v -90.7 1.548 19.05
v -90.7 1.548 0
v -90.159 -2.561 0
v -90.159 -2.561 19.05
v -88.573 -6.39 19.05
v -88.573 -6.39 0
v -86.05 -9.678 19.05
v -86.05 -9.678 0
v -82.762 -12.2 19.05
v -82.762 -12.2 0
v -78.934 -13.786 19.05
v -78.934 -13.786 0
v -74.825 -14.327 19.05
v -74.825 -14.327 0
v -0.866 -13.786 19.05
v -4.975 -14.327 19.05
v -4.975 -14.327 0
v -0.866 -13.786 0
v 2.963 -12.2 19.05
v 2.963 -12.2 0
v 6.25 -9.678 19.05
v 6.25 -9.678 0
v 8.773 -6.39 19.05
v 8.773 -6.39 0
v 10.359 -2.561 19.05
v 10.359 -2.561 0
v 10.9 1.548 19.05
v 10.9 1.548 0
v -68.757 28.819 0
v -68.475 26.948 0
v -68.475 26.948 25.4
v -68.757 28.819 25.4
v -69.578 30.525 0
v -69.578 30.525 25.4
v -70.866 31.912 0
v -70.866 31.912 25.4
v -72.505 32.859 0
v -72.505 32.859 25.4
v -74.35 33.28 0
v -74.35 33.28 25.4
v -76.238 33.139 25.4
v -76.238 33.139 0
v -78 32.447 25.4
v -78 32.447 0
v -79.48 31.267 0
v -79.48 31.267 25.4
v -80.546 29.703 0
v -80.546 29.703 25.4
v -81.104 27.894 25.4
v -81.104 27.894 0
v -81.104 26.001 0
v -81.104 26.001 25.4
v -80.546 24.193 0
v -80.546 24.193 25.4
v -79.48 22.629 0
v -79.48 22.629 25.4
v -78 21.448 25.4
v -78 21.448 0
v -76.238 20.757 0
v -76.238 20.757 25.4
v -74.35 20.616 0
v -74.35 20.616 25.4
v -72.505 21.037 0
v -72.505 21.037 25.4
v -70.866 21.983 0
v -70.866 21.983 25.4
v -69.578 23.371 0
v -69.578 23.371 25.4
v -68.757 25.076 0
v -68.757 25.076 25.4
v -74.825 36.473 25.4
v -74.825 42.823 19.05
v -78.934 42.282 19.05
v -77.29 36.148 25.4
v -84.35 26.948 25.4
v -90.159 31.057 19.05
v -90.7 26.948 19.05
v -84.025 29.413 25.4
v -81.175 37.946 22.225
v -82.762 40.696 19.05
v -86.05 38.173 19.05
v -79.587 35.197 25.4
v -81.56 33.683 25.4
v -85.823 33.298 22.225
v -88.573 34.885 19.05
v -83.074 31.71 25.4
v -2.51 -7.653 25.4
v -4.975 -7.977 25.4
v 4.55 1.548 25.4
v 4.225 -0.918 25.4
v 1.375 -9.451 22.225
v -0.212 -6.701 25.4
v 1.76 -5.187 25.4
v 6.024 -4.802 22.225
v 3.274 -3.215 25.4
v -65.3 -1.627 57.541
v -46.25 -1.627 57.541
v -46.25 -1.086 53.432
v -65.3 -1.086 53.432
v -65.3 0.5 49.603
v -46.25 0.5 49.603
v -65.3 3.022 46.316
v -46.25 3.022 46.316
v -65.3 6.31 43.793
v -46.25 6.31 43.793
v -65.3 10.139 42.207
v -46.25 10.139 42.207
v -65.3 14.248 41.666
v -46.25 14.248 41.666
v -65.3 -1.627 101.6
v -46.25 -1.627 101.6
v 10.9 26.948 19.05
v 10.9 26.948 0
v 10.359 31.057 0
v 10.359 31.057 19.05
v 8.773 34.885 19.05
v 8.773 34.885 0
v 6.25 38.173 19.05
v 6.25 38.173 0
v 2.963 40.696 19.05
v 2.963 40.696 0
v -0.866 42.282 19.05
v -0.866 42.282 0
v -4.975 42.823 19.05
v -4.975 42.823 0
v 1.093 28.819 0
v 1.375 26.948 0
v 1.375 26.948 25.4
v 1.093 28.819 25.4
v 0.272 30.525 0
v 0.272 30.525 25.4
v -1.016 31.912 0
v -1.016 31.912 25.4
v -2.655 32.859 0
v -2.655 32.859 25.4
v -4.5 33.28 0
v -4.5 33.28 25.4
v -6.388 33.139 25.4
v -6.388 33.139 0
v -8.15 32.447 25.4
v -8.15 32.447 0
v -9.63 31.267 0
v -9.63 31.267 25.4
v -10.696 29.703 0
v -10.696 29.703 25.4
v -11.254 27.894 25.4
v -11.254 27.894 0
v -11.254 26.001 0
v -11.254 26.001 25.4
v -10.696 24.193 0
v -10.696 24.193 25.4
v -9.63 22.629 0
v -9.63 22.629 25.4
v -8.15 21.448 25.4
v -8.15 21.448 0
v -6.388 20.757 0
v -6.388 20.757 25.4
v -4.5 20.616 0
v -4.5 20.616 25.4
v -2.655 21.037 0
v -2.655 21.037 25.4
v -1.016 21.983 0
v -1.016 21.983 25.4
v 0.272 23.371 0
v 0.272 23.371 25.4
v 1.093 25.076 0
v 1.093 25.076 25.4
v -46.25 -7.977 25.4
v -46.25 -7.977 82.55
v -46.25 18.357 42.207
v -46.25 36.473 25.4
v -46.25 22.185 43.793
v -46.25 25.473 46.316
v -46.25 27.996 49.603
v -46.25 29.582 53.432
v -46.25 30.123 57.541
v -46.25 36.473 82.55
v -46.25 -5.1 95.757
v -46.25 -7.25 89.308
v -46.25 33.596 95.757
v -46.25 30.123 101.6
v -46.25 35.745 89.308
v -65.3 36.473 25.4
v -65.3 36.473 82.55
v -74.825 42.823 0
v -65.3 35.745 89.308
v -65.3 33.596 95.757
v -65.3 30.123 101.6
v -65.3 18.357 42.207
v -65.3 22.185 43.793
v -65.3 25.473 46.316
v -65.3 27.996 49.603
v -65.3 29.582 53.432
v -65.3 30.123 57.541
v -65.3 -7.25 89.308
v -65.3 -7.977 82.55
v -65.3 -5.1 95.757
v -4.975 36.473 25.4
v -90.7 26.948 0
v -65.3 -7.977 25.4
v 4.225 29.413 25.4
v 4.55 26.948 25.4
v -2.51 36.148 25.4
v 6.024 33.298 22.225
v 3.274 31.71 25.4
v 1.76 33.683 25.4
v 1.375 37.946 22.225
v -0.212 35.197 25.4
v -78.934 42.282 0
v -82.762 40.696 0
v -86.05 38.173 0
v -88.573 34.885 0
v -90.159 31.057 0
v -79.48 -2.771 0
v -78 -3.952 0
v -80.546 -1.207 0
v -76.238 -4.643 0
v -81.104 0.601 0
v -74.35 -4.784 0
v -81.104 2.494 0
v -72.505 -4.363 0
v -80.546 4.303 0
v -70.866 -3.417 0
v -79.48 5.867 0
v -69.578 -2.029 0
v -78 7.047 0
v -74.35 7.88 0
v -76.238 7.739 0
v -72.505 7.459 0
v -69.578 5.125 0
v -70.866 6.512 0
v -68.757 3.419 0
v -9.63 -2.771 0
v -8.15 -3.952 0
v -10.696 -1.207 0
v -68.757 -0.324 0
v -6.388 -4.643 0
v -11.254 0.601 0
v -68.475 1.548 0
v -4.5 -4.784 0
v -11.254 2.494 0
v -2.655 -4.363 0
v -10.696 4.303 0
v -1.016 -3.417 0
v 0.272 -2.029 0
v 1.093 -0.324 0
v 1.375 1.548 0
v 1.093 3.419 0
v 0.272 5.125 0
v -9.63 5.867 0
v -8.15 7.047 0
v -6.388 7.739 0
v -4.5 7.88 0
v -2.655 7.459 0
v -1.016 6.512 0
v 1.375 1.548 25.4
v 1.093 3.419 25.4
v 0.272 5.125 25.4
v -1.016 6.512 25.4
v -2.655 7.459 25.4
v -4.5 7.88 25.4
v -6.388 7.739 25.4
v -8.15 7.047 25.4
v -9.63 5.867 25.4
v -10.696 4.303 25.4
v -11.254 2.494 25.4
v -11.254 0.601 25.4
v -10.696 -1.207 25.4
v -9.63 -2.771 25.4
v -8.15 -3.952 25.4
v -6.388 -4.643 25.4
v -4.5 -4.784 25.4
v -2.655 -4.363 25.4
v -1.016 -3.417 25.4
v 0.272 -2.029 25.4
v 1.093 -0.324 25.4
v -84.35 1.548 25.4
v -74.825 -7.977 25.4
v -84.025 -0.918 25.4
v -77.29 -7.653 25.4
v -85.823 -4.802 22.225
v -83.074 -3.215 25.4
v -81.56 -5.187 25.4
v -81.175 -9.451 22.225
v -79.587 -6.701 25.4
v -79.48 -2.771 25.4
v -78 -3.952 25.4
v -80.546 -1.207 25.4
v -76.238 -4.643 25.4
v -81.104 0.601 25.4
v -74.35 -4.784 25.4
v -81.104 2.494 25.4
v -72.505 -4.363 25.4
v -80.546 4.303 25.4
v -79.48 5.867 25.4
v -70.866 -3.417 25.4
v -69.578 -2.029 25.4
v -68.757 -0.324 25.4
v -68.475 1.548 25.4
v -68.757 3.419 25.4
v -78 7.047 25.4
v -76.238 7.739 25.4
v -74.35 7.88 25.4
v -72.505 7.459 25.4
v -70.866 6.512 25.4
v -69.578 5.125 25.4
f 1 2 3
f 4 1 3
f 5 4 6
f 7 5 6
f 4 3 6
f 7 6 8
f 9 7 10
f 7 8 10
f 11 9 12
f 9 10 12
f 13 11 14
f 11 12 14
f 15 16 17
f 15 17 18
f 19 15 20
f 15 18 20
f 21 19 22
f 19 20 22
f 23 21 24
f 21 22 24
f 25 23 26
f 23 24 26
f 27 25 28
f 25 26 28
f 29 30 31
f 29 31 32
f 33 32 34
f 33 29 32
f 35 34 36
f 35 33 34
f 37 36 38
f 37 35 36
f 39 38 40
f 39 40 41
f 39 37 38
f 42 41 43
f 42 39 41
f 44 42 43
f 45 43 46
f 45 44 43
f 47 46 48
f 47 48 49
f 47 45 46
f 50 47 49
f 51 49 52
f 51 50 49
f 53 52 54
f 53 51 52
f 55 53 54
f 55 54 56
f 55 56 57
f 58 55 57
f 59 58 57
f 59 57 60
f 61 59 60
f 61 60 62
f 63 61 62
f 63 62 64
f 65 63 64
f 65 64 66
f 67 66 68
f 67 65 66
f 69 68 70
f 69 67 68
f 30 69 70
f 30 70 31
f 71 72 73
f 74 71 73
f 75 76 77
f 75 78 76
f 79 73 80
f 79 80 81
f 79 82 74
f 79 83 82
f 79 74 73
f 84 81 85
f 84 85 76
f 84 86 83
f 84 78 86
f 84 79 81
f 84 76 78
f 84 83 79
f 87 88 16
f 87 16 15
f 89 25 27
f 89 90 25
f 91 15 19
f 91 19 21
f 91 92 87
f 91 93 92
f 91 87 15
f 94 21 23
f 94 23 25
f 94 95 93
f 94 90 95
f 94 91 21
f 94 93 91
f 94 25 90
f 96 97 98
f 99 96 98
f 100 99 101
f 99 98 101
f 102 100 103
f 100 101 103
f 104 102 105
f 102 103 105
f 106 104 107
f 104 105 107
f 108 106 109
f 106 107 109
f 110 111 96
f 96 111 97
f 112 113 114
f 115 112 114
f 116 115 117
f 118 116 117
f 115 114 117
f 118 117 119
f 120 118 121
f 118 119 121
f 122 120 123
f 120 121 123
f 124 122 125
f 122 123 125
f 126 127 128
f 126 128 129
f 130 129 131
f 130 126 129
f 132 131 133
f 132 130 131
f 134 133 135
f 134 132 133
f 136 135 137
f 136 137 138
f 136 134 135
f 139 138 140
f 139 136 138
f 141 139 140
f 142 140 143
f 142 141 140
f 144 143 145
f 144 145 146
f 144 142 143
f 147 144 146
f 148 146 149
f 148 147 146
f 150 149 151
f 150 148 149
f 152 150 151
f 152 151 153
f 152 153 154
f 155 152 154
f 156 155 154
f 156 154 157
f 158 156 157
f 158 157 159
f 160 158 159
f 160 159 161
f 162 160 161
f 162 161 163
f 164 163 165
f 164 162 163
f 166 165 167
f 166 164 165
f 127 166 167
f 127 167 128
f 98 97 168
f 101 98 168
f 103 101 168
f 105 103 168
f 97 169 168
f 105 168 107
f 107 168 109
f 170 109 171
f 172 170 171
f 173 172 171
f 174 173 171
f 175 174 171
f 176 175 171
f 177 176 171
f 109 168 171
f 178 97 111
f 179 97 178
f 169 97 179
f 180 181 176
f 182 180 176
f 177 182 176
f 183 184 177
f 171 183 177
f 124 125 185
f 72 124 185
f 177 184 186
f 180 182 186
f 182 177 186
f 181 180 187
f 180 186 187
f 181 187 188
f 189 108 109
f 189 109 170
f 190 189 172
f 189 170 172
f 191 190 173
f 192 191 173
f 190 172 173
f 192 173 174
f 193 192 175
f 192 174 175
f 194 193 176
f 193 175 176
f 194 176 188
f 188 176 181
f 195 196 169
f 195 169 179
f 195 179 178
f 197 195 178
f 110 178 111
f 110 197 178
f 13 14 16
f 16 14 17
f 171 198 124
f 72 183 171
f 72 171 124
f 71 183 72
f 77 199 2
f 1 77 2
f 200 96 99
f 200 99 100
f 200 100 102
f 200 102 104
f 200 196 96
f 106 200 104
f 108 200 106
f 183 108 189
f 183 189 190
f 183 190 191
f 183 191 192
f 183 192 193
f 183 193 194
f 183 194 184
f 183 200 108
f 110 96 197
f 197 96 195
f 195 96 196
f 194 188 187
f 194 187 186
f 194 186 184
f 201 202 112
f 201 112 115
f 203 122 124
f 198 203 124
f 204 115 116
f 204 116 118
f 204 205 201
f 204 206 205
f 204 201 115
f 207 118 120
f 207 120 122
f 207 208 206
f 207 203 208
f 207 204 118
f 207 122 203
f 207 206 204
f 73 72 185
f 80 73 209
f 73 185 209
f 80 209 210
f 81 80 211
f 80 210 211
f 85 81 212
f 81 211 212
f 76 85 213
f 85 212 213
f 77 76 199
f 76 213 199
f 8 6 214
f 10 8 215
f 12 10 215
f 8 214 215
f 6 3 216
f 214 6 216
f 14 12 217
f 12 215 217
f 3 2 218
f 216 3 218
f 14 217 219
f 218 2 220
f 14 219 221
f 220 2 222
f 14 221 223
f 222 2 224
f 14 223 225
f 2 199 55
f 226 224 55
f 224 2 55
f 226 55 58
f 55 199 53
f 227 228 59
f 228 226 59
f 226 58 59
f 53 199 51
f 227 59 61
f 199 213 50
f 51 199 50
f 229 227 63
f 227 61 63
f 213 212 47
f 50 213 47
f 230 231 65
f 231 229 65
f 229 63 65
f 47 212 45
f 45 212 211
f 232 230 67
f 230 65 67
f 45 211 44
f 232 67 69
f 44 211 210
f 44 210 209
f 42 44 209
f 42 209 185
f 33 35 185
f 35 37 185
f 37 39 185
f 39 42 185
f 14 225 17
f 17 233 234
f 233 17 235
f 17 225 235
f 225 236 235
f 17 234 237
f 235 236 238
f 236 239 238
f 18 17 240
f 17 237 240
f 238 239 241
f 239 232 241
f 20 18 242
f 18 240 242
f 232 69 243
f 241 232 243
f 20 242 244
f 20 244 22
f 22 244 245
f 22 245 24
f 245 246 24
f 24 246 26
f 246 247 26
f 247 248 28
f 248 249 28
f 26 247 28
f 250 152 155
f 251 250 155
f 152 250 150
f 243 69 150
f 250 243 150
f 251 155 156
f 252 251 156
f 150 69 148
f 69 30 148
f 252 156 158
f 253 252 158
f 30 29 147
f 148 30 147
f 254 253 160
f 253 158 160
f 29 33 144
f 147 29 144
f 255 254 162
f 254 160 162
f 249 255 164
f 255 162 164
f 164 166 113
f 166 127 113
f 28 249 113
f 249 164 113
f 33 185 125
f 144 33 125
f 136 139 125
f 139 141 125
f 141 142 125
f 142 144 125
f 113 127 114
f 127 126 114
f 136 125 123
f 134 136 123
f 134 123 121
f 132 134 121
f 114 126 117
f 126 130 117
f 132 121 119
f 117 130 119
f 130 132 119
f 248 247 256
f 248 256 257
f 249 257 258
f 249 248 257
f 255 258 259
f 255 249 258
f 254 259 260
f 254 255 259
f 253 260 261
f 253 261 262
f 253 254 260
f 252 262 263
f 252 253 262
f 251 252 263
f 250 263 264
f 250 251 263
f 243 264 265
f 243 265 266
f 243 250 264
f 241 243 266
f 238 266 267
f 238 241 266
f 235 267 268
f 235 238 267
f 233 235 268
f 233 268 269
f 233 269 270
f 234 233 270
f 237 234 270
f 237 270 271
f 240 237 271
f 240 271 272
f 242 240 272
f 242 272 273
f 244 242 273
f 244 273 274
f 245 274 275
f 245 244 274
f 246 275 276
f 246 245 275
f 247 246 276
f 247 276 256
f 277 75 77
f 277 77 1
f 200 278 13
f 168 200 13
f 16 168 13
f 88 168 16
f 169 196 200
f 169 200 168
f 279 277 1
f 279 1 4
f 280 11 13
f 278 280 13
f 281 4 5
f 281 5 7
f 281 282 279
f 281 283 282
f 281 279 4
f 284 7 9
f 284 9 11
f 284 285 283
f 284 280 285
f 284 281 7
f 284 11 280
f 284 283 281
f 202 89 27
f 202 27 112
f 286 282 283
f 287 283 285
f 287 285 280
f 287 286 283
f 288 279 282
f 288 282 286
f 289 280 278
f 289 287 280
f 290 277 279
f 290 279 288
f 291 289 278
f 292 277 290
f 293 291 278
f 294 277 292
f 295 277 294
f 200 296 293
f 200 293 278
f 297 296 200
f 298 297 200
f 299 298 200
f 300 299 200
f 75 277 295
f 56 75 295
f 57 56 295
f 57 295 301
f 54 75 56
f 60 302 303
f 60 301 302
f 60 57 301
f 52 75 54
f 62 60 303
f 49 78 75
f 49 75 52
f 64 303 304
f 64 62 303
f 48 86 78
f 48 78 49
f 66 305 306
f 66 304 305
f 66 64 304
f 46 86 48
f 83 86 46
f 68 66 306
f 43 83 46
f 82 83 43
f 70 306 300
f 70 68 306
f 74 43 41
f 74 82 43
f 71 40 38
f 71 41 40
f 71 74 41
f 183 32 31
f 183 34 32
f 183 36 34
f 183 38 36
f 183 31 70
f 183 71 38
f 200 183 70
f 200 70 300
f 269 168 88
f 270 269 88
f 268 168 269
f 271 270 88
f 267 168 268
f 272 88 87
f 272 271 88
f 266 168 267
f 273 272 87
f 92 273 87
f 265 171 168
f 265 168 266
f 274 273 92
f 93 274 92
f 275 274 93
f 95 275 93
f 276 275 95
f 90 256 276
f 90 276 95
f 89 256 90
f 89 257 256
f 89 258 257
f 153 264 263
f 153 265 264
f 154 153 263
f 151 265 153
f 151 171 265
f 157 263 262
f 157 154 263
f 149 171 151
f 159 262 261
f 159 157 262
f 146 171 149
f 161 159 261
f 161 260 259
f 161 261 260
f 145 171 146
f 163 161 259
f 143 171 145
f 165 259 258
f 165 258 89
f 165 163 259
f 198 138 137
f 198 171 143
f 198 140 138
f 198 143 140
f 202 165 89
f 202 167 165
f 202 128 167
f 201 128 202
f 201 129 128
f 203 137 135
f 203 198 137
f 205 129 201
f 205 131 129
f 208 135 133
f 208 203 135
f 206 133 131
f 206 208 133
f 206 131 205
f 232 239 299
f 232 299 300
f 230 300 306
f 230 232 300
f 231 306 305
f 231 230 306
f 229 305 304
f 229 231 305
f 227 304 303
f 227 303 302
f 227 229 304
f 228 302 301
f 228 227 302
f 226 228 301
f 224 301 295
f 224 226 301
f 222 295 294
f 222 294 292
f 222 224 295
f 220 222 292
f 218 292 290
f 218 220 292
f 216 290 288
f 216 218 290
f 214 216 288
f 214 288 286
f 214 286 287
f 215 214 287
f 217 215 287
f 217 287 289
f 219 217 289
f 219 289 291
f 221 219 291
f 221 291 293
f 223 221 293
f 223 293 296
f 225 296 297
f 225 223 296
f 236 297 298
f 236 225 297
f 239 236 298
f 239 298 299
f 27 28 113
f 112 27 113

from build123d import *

# Parameters (mm, degrees)
F0_R        = 6.35
F1_DEPTH    = 25.4
F2_SIZE     = 6.35
F3_W        = 19.05
F3_H        = 44.45
F4_DEPTH    = 76.2
F6_DEPTH    = 19.05
F8_DEPTH    = 25.4
F9_T1_DEPTH = 114.3


# Not quite as in the source:
# - a fillet or chamfer that OpenCascade refuses, or shapes differently, is made with other operations: its cross-section is extruded or revolved along the edge and cut away or added


with BuildPart() as f1:
    # F0 (on Top) → F1 (new body)
    with BuildSketch(Plane.XY):
        with BuildLine():
            Line((-4.9749455661, 42.822749579), (-74.8249455661, 42.822749579))
            ThreePointArc((-74.8249455661, 42.822749579), (-86.0502657174, 38.1730697303), (-90.6999455661, 26.947749579))
            Line((-90.6999455661, 26.947749579), (-90.6999455661, 1.547749579))
            ThreePointArc((-90.6999455661, 1.547749579), (-86.0502657174, -9.6775705724), (-74.8249455661, -14.327250421))
            Line((-74.8249455661, -14.327250421), (-4.9749455661, -14.327250421))
            ThreePointArc((-4.9749455661, -14.327250421), (6.2503745853, -9.6775705724), (10.9000544339, 1.547749579))
            Line((10.9000544339, 1.547749579), (10.9000544339, 26.947749579))
            ThreePointArc((10.9000544339, 26.947749579), (6.2503745853, 38.1730697303), (-4.9749455661, 42.822749579))
        make_face()
        with Locations((-74.8249455661, 1.547749579)):
            Circle(F0_R, mode=Mode.SUBTRACT)
        with Locations((-4.9749455661, 1.547749579)):
            Circle(F0_R, mode=Mode.SUBTRACT)
        with Locations((-74.8249455661, 26.947749579)):
            Circle(F0_R, mode=Mode.SUBTRACT)
        with Locations((-4.9749455661, 26.947749579)):
            Circle(F0_R, mode=Mode.SUBTRACT)
    extrude(amount=F1_DEPTH)

    # F2
    f2_edges = [f1.edges().sort_by_distance(p)[0] for p in [
        (6.250375, -9.677571, 25.4),
        (10.900054, 14.24775, 25.4),
        (6.250375, 38.17307, 25.4),
        (-39.899946, 42.82275, 25.4),
        (-86.050266, 38.17307, 25.4),
        (-90.699946, 14.24775, 25.4),
        (-86.050266, -9.677571, 25.4),
        (-39.899946, -14.32725, 25.4),
    ]]
    chamfer(f2_edges, length=F2_SIZE)

    # F3 (on face) → F4 (join)
    with BuildSketch(Plane.XY.offset(25.4)):
        with Locations((-55.7749455661, 14.247749579)):
            Rectangle(F3_W, F3_H)
    extrude(amount=F4_DEPTH)

    # F5 (on face) → F6 (cut, through all)
    with BuildSketch(Plane.YZ.offset(-46.2499455661)):
        with BuildLine():
            ThreePointArc((14.247749579, 41.6659471005), (25.4730697303, 46.3156269492), (30.122749579, 57.5409471005))
            ThreePointArc((30.122749579, 57.5409471005), (3.0224294276, 68.7662672519), (14.247749579, 41.6659471005))
        make_face()
    extrude(amount=-F6_DEPTH, mode=Mode.SUBTRACT)

    # F7 (on face) → F8 (cut)
    with BuildSketch(Plane.YZ.offset(-46.2499455661)):
        with BuildLine():
            ThreePointArc((-1.627250421, 57.5409471005), (14.247749579, 73.4159471005), (30.122749579, 57.5409471005))
            Line((30.122749579, 57.5409471005), (30.122749579, 101.6))
            Line((30.122749579, 101.6), (-1.627250421, 101.6))
            Line((-1.627250421, 101.6), (-1.627250421, 57.5409471005))
        make_face()
    extrude(amount=-F8_DEPTH, mode=Mode.SUBTRACT)

    # F9: fillet of radius 31.75 on 2 edges, made by hand

    # F9_s2 → F9_t1 (cut)
    with BuildSketch(Plane.YZ.offset(-112.9249455661)):
        with BuildLine():
            ThreePointArc((-7.977250421, 82.55), (-6.3479451342, 92.590231571), (-1.627250421, 101.6))
            Line((-1.627250421, 101.6), (-7.977250421, 101.6))
            Line((-7.977250421, 101.6), (-7.977250421, 82.55))
        make_face()
        with BuildLine():
            ThreePointArc((36.472749579, 82.55), (34.8434442921, 92.590231571), (30.122749579, 101.6))
            Line((30.122749579, 101.6), (36.472749579, 101.6))
            Line((36.472749579, 101.6), (36.472749579, 82.55))
        make_face()
    extrude(amount=F9_T1_DEPTH, mode=Mode.SUBTRACT)


solid = f1.part
